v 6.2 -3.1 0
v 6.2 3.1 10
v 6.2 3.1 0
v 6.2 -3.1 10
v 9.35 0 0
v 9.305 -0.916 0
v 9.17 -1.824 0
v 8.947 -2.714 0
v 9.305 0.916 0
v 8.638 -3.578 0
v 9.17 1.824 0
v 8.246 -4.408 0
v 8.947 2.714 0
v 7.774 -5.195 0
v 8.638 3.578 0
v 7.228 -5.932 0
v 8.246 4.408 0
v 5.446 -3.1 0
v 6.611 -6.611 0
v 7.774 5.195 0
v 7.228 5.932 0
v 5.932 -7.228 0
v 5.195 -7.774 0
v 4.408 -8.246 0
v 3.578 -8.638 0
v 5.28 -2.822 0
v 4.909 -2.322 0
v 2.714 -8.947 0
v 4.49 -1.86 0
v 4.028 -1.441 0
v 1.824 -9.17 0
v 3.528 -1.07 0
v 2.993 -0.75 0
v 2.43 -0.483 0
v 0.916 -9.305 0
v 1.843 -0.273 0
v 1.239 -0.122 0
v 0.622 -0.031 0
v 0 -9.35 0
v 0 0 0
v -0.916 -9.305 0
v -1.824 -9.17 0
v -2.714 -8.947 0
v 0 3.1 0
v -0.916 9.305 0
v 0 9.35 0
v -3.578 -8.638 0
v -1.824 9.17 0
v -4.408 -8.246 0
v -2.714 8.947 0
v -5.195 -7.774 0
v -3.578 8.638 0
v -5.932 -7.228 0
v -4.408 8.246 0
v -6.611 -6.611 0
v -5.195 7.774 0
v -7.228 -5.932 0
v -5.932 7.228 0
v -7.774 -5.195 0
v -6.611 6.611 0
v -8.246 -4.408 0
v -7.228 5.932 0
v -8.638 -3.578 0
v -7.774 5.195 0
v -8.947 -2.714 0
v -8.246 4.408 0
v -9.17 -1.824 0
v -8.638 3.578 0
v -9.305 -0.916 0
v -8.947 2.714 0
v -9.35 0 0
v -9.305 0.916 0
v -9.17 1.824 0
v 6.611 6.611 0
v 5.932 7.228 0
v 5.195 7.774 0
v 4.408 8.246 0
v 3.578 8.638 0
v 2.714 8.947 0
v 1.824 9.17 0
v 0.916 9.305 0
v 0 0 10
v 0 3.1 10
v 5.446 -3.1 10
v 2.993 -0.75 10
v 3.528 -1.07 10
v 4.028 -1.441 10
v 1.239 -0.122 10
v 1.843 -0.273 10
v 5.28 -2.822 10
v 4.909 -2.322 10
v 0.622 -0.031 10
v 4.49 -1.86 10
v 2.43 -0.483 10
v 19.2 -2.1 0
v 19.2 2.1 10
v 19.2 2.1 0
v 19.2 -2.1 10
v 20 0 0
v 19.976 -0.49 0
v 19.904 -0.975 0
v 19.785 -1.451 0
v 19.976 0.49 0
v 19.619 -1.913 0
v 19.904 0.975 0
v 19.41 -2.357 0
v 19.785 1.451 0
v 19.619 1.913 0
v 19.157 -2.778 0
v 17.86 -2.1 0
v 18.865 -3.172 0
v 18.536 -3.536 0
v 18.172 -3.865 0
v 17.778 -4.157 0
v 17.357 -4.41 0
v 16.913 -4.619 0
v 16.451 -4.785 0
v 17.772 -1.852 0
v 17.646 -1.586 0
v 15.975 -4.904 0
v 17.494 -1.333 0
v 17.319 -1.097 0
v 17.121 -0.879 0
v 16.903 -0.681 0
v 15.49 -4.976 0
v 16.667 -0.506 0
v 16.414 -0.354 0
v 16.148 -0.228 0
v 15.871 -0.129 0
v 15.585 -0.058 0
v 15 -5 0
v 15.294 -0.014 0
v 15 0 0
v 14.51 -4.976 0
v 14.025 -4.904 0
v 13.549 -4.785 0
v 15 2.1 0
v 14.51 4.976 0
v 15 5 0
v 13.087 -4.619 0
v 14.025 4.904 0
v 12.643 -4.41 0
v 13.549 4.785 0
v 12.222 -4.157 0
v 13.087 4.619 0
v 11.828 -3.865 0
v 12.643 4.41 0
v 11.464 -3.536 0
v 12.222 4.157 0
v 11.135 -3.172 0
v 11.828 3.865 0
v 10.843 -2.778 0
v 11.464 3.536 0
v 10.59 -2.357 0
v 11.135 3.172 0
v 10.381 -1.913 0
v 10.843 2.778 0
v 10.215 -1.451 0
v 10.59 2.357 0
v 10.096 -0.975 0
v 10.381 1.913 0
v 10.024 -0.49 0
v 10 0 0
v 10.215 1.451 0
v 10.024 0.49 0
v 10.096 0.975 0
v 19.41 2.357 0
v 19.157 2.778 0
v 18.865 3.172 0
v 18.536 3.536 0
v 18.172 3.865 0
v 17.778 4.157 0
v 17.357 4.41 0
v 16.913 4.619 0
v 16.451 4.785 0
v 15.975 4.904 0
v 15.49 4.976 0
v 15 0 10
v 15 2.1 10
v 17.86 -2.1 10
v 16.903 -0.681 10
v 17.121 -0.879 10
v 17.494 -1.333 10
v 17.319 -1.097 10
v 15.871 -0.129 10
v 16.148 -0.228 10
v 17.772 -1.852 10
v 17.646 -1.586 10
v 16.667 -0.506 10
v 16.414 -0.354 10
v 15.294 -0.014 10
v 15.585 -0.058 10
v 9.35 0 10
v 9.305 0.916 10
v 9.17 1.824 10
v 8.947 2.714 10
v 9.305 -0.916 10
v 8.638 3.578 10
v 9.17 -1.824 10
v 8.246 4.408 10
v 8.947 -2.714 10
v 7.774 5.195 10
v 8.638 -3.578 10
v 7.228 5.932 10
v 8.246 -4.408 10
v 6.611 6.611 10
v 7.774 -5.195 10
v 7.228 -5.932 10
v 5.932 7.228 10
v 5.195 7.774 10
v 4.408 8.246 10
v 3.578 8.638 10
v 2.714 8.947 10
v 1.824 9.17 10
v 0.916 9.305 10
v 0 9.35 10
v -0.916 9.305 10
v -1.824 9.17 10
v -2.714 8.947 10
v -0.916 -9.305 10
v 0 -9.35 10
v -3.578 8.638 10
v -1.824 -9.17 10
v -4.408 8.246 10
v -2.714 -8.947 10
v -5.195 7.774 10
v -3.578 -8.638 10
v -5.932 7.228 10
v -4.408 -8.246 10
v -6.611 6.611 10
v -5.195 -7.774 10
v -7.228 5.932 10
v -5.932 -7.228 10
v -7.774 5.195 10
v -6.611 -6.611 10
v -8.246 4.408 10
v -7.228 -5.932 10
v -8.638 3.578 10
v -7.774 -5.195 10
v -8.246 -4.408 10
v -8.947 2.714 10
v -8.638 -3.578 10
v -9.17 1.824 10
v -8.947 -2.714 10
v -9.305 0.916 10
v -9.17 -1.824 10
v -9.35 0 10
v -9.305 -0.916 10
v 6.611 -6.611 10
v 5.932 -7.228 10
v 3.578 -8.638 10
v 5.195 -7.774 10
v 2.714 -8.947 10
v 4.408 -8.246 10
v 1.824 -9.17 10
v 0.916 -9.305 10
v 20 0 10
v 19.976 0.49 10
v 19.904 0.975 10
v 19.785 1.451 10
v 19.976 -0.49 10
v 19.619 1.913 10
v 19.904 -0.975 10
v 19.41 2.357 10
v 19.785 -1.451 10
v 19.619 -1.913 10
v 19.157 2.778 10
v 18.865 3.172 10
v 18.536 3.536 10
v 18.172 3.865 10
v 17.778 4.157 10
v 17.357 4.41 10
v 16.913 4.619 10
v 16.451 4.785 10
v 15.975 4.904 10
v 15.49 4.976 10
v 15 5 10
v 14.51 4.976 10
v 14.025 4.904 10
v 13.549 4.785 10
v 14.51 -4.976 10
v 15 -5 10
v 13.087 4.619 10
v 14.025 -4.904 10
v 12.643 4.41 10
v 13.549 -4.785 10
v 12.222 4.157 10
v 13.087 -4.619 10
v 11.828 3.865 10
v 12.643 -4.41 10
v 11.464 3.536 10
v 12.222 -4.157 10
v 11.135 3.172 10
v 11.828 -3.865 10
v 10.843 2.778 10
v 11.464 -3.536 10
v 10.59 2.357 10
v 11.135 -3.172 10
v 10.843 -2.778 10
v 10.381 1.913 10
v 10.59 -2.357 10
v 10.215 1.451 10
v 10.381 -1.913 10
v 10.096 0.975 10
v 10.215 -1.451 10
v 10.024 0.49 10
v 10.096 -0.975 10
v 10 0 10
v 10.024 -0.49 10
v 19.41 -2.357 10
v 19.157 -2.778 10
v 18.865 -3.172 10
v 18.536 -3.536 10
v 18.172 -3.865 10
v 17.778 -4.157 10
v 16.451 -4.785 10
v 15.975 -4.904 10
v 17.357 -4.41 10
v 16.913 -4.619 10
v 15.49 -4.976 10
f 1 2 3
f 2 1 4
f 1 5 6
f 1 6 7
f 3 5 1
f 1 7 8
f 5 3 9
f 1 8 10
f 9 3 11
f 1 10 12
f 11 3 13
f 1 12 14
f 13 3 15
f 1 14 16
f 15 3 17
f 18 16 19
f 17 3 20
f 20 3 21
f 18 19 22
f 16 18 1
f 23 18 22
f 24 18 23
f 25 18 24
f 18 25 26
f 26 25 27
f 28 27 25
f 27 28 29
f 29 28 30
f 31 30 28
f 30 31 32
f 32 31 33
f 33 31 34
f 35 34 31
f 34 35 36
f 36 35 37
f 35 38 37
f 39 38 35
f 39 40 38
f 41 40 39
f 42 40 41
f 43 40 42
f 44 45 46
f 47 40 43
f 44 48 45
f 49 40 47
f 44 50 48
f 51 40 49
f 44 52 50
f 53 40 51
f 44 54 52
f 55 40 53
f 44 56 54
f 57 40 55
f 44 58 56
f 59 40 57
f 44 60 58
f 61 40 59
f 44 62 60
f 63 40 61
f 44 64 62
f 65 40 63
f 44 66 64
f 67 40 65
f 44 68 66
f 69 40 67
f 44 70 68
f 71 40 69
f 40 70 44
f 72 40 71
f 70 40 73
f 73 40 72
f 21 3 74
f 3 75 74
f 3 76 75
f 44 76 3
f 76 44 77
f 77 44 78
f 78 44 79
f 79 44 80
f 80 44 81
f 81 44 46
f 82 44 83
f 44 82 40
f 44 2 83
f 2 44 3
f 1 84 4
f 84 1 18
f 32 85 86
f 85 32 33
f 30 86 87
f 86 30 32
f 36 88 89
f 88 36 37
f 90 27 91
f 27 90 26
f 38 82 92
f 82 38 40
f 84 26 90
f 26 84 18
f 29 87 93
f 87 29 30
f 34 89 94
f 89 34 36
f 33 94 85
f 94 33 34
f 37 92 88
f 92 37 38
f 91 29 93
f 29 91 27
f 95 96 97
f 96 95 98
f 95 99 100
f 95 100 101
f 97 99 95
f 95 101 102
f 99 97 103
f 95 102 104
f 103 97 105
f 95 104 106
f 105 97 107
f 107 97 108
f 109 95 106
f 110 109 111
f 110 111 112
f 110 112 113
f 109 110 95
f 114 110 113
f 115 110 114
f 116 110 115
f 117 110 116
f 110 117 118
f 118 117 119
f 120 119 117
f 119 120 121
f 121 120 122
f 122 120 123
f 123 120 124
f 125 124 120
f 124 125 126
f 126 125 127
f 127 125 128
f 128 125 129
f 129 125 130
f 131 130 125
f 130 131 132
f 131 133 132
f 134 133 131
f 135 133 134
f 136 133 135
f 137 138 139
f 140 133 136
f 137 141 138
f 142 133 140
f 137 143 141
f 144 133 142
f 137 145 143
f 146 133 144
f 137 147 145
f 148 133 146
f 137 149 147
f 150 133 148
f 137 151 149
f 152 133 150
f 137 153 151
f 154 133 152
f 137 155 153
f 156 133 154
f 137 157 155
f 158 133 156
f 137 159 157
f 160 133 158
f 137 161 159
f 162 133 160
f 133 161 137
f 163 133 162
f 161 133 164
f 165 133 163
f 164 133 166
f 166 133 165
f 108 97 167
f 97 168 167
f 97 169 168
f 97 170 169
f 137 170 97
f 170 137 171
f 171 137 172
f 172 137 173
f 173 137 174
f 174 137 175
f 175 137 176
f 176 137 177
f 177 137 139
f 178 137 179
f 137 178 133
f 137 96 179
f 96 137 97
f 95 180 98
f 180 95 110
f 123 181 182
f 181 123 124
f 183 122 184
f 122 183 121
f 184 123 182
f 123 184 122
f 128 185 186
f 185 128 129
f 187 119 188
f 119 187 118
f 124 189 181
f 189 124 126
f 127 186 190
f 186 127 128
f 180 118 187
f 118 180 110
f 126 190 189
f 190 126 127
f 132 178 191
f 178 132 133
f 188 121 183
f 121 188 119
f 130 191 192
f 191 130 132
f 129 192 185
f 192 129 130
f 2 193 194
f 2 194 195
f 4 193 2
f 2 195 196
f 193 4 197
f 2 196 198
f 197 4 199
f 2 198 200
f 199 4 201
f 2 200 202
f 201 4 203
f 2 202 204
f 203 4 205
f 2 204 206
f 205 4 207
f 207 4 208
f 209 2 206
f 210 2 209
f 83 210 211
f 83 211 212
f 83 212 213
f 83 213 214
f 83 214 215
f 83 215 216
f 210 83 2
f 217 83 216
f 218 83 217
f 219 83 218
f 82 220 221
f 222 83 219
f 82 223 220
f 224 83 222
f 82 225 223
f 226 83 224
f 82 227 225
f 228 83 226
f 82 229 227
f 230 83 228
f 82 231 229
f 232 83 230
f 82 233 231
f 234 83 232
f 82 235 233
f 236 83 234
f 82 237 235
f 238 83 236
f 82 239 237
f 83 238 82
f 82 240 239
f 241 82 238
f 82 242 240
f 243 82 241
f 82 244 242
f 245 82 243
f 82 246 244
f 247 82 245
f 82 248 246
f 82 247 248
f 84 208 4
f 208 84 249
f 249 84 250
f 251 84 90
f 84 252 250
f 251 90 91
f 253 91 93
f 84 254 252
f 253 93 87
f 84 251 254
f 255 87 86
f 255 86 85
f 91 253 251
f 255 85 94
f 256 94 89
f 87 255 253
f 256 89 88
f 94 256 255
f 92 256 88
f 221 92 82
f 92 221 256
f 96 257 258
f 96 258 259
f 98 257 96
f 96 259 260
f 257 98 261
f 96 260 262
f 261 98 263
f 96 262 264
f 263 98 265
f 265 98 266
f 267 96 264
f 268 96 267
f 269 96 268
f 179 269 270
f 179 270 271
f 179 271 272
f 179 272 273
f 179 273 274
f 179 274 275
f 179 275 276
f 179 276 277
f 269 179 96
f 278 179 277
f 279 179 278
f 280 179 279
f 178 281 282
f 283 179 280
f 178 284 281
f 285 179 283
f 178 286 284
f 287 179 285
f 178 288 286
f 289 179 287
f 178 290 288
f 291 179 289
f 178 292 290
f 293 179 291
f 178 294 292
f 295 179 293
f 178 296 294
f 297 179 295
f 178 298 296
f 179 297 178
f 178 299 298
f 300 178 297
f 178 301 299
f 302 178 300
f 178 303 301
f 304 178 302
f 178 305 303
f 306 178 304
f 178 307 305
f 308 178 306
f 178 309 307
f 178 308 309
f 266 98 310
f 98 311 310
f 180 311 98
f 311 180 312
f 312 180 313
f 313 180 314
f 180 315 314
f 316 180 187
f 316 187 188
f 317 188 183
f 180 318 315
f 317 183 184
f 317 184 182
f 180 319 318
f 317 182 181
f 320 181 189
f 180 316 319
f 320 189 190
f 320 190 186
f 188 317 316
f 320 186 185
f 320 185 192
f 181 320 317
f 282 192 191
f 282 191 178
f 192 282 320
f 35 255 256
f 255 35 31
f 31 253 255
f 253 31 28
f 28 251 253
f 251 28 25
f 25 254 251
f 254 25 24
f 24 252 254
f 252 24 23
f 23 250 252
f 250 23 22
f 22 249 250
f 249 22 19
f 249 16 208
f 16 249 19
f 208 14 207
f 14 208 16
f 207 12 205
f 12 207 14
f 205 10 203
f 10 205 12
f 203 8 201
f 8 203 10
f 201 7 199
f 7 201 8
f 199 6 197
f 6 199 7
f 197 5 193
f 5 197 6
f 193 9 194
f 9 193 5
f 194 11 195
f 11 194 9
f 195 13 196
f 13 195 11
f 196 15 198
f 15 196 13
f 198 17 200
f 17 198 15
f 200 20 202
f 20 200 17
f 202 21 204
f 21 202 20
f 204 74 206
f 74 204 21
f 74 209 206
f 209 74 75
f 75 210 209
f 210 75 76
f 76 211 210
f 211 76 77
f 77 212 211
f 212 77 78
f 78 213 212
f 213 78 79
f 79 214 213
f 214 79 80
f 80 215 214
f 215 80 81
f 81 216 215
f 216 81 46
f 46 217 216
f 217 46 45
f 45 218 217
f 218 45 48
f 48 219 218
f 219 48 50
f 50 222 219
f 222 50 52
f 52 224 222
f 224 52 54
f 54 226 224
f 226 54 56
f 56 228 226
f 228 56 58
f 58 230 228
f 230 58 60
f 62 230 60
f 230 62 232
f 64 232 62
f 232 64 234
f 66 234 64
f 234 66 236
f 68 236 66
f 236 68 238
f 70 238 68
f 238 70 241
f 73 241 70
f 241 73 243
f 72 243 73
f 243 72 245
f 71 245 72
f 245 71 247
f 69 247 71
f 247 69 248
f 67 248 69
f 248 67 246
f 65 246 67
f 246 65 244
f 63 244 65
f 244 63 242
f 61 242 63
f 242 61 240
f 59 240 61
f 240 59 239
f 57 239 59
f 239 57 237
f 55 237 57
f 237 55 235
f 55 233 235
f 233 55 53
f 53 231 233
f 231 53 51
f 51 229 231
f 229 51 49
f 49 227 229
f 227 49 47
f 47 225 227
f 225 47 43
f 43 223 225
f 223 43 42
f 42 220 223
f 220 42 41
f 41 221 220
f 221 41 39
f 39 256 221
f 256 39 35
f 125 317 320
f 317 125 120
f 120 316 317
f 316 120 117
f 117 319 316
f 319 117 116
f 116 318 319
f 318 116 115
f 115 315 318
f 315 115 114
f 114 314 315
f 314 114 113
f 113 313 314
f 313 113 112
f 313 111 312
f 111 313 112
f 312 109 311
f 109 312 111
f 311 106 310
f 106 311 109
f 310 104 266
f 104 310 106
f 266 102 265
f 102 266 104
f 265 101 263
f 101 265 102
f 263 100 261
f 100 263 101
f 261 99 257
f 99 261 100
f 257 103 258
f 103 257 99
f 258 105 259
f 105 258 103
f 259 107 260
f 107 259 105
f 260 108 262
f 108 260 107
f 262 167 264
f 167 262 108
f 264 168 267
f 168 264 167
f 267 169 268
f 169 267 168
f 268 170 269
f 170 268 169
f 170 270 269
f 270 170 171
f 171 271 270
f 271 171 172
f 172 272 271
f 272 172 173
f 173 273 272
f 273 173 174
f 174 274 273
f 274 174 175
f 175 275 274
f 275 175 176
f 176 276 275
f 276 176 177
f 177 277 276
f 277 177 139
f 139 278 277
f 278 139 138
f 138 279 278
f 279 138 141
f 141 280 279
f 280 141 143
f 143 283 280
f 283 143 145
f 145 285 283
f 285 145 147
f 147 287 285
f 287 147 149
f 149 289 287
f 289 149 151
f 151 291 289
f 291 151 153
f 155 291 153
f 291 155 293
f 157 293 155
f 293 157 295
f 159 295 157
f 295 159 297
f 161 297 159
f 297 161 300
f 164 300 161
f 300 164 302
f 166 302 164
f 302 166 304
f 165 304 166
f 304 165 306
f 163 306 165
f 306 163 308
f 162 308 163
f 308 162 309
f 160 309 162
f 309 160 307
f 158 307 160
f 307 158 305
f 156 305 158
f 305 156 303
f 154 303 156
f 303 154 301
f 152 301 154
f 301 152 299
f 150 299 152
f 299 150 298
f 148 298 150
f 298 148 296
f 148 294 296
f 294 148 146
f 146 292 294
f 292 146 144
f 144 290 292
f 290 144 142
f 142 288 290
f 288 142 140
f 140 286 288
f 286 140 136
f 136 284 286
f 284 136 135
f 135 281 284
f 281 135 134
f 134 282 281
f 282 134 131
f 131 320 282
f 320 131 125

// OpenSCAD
$fn = 128; // High resolution for smooth curves and accurate hole sizes

// --- Dimensions (mm) ---
// Rod Stand Dimensions
ROD_DIAMETER = 12.7;
ROD_WALL_THICKNESS = 3;
ROD_OUTER_DIAMETER = ROD_DIAMETER + 2 * ROD_WALL_THICKNESS; // 18.7

// Tubing Dimensions
TUBING_DIAMETER = 6;
TUBING_WALL_THICKNESS = 2;
TUBING_OUTER_DIAMETER = TUBING_DIAMETER + 2 * TUBING_WALL_THICKNESS; // 10

// Positioning
RING_ROD_X = 0;
RING_TUBING_X = 15;

// Bridge Dimensions
BRIDGE_WIDTH_X = 4; // From x=8 to x=12
BRIDGE_WIDTH_Y = 6;

// Cutout Dimensions
CUTOUT_ROD_WIDTH = 10;
CUTOUT_ROD_Y_LIMIT = 5; // -5 < y < 5

CUTOUT_TUBING_WIDTH = 4.5;
CUTOUT_TUBING_Y_LIMIT = 2.25; // -2.25 < y < 2.25

// Extrusion Height
EXTRUSION_HEIGHT = 10;

// --- Generation ---

difference() {
    // 1. The Main Profile (Extruded)
    // center = false ensures the bottom of the extrusion is at z=0
    linear_extrude(height = EXTRUSION_HEIGHT, center = false) {
        translate([0, 0, EXTRUSION_HEIGHT / 2]) {
            union() {
                // --- Ring for Rod Stand ---
                circle(
                    r = ROD_OUTER_DIAMETER / 2,
                    $fn = 64
                );
                
                // Cutout for Rod Stand (-X side)
                // Remove everything with x < 0 and -5 < y < 5
                // We use a cylinder to cut through the ring profile fully
                difference() {
                    // The ring itself (already drawn above)
                    // We subtract a cylinder that spans the full height of the profile
                    // The cylinder radius must be large enough to cover the y-limits
                    translate([0, -CUTOUT_ROD_Y_LIMIT, 0]) 
                        cylinder(h = EXTRUSION_HEIGHT, r = CUTOUT_ROD_Y_LIMIT, $fn = 64);
                    
                    // We also need to ensure the cutout is wide enough in X
                    // The cylinder above covers the Y range. We need to intersect with X < 0.
                    // Since we are in a difference, we can just subtract the cylinder.
                    // However, the cylinder extends to x=+5. We only want x<0.
                    // Let's refine: Subtract a box that covers the cutout area.
                }
                
                // Refined Cutout for Rod Stand:
                // Subtract a box that covers x < 0 and -5 < y < 5, spanning full height.
                translate([-CUTOUT_ROD_WIDTH / 2, -CUTOUT_ROD_Y_LIMIT, 0]) 
                    cube([CUTOUT_ROD_WIDTH, CUTOUT_ROD_Y_LIMIT * 2, EXTRUSION_HEIGHT]);
                
                // --- Ring for Tubing ---
                translate([RING_TUBING_X, 0, 0]) {
                    circle(
                        r = TUBING_OUTER_DIAMETER / 2,
                        $fn = 64
                    );
                    
                    // Cutout for Tubing (+X side)
                    // Remove everything with x > 15 and -2.25 < y < 2.25
                    // Subtract a box covering x > 15 (relative to origin) and the Y range
                    // Box center at x=15, width 4.5, y range +/- 2.25
                    translate([RING_TUBING_X - CUTOUT_TUBING_WIDTH / 2, -CUTOUT_TUBING_Y_LIMIT, 0]) 
                        cube([CUTOUT_TUBING_WIDTH, CUTOUT_TUBING_Y_LIMIT * 2, EXTRUSION_HEIGHT]);
                }
                
                // --- Solid Bridge ---
                // Joins x=8 to x=12, width 6mm in Y
                translate([8, -BRIDGE_WIDTH_Y / 2, 0]) 
                    cube([BRIDGE_WIDTH_X, BRIDGE_WIDTH_Y, EXTRUSION_HEIGHT]);
            }
        }
    }
    
    // 2. Cutouts for the Holes (Difference shapes)
    // We subtract the inner voids of the rings to create the holes.
    // Extend slightly past the inner diameter to ensure clean walls.
    
    // Hole for Rod Stand
    translate([RING_ROD_X, 0, 0]) {
        difference() {
            // Outer shape of the hole (slightly larger than inner diameter to cut through)
            // This box defines the wall thickness area to be removed
            translate([0, -ROD_WALL_THICKNESS - 0.1, 0]) 
                cube([ROD_WALL_THICKNESS * 2 + 0.2, ROD_WALL_THICKNESS * 2 + 0.2, EXTRUSION_HEIGHT + 0.1]);
            
            // Inner void (negative space) - Cylinder to match the rod diameter
            translate([0, -ROD_DIAMETER / 2, 0]) 
                cylinder(h = EXTRUSION_HEIGHT + 0.1, r = ROD_DIAMETER / 2, $fn = 64);
        }
    }
    
    // Hole for Tubing
    translate([RING_TUBING_X, 0, 0]) {
        difference() {
            // Outer shape of the hole
            translate([0, -TUBING_WALL_THICKNESS - 0.1, 0]) 
                cube([TUBING_WALL_THICKNESS * 2 + 0.2, TUBING_WALL_THICKNESS * 2 + 0.2, EXTRUSION_HEIGHT + 0.1]);
            
            // Inner void (negative space)
            translate([0, -TUBING_DIAMETER / 2, 0]) 
                cylinder(h = EXTRUSION_HEIGHT + 0.1, r = TUBING_DIAMETER / 2, $fn = 64);
        }
    }
}
